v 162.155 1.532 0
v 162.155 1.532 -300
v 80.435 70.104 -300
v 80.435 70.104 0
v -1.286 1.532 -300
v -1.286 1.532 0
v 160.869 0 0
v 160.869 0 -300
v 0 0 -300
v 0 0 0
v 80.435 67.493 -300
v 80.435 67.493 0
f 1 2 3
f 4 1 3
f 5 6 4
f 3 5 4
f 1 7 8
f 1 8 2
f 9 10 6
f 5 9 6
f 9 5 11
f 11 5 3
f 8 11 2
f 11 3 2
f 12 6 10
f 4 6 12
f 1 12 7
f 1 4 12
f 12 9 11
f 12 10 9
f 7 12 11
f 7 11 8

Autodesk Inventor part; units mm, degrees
ref_plane "YZ Plane" through (0, 0, 0) normal (1, 0, 0) x (0, 1, 0)
ref_plane "XZ Plane" through (0, 0, 0) normal (0, 1, 0) x (-1, 0, 0)
ref_plane "XY Plane" through (0, 0, 0) normal (0, 0, 1) x (1, 0, 0)
sketch "Sketch1" plane through (0, 0, 0) normal (0, 0, 1) x (1, 0, 0)
  line L0 (0, 0) -> (80.4347, 67.4927)
  line L1 (80.4347, 67.4927) -> (160.8693, 0)
  line L2 (0, 0) -> (279.217, 0) construction
  line L3 (160.8693, 0) -> (162.1549, 1.5321)
  line L4 (162.1549, 1.5321) -> (80.4347, 70.1035)
  line L5 (-1.2856, 1.5321) -> (80.4347, 70.1035)
  line L6 (0, 0) -> (-1.2856, 1.5321)
  dimension "d0" = 105
  dimension "d1" = 105
  dimension "d2" = 100
  dimension "d3" = 2
  dimension "d4" = 90
  dimension "d7" = 2
  dimension "d8" = 90
extrude "Extrusion1" add sketch "Sketch1" against normal blind 300
properties part number "techo" material "PET Plastic"
